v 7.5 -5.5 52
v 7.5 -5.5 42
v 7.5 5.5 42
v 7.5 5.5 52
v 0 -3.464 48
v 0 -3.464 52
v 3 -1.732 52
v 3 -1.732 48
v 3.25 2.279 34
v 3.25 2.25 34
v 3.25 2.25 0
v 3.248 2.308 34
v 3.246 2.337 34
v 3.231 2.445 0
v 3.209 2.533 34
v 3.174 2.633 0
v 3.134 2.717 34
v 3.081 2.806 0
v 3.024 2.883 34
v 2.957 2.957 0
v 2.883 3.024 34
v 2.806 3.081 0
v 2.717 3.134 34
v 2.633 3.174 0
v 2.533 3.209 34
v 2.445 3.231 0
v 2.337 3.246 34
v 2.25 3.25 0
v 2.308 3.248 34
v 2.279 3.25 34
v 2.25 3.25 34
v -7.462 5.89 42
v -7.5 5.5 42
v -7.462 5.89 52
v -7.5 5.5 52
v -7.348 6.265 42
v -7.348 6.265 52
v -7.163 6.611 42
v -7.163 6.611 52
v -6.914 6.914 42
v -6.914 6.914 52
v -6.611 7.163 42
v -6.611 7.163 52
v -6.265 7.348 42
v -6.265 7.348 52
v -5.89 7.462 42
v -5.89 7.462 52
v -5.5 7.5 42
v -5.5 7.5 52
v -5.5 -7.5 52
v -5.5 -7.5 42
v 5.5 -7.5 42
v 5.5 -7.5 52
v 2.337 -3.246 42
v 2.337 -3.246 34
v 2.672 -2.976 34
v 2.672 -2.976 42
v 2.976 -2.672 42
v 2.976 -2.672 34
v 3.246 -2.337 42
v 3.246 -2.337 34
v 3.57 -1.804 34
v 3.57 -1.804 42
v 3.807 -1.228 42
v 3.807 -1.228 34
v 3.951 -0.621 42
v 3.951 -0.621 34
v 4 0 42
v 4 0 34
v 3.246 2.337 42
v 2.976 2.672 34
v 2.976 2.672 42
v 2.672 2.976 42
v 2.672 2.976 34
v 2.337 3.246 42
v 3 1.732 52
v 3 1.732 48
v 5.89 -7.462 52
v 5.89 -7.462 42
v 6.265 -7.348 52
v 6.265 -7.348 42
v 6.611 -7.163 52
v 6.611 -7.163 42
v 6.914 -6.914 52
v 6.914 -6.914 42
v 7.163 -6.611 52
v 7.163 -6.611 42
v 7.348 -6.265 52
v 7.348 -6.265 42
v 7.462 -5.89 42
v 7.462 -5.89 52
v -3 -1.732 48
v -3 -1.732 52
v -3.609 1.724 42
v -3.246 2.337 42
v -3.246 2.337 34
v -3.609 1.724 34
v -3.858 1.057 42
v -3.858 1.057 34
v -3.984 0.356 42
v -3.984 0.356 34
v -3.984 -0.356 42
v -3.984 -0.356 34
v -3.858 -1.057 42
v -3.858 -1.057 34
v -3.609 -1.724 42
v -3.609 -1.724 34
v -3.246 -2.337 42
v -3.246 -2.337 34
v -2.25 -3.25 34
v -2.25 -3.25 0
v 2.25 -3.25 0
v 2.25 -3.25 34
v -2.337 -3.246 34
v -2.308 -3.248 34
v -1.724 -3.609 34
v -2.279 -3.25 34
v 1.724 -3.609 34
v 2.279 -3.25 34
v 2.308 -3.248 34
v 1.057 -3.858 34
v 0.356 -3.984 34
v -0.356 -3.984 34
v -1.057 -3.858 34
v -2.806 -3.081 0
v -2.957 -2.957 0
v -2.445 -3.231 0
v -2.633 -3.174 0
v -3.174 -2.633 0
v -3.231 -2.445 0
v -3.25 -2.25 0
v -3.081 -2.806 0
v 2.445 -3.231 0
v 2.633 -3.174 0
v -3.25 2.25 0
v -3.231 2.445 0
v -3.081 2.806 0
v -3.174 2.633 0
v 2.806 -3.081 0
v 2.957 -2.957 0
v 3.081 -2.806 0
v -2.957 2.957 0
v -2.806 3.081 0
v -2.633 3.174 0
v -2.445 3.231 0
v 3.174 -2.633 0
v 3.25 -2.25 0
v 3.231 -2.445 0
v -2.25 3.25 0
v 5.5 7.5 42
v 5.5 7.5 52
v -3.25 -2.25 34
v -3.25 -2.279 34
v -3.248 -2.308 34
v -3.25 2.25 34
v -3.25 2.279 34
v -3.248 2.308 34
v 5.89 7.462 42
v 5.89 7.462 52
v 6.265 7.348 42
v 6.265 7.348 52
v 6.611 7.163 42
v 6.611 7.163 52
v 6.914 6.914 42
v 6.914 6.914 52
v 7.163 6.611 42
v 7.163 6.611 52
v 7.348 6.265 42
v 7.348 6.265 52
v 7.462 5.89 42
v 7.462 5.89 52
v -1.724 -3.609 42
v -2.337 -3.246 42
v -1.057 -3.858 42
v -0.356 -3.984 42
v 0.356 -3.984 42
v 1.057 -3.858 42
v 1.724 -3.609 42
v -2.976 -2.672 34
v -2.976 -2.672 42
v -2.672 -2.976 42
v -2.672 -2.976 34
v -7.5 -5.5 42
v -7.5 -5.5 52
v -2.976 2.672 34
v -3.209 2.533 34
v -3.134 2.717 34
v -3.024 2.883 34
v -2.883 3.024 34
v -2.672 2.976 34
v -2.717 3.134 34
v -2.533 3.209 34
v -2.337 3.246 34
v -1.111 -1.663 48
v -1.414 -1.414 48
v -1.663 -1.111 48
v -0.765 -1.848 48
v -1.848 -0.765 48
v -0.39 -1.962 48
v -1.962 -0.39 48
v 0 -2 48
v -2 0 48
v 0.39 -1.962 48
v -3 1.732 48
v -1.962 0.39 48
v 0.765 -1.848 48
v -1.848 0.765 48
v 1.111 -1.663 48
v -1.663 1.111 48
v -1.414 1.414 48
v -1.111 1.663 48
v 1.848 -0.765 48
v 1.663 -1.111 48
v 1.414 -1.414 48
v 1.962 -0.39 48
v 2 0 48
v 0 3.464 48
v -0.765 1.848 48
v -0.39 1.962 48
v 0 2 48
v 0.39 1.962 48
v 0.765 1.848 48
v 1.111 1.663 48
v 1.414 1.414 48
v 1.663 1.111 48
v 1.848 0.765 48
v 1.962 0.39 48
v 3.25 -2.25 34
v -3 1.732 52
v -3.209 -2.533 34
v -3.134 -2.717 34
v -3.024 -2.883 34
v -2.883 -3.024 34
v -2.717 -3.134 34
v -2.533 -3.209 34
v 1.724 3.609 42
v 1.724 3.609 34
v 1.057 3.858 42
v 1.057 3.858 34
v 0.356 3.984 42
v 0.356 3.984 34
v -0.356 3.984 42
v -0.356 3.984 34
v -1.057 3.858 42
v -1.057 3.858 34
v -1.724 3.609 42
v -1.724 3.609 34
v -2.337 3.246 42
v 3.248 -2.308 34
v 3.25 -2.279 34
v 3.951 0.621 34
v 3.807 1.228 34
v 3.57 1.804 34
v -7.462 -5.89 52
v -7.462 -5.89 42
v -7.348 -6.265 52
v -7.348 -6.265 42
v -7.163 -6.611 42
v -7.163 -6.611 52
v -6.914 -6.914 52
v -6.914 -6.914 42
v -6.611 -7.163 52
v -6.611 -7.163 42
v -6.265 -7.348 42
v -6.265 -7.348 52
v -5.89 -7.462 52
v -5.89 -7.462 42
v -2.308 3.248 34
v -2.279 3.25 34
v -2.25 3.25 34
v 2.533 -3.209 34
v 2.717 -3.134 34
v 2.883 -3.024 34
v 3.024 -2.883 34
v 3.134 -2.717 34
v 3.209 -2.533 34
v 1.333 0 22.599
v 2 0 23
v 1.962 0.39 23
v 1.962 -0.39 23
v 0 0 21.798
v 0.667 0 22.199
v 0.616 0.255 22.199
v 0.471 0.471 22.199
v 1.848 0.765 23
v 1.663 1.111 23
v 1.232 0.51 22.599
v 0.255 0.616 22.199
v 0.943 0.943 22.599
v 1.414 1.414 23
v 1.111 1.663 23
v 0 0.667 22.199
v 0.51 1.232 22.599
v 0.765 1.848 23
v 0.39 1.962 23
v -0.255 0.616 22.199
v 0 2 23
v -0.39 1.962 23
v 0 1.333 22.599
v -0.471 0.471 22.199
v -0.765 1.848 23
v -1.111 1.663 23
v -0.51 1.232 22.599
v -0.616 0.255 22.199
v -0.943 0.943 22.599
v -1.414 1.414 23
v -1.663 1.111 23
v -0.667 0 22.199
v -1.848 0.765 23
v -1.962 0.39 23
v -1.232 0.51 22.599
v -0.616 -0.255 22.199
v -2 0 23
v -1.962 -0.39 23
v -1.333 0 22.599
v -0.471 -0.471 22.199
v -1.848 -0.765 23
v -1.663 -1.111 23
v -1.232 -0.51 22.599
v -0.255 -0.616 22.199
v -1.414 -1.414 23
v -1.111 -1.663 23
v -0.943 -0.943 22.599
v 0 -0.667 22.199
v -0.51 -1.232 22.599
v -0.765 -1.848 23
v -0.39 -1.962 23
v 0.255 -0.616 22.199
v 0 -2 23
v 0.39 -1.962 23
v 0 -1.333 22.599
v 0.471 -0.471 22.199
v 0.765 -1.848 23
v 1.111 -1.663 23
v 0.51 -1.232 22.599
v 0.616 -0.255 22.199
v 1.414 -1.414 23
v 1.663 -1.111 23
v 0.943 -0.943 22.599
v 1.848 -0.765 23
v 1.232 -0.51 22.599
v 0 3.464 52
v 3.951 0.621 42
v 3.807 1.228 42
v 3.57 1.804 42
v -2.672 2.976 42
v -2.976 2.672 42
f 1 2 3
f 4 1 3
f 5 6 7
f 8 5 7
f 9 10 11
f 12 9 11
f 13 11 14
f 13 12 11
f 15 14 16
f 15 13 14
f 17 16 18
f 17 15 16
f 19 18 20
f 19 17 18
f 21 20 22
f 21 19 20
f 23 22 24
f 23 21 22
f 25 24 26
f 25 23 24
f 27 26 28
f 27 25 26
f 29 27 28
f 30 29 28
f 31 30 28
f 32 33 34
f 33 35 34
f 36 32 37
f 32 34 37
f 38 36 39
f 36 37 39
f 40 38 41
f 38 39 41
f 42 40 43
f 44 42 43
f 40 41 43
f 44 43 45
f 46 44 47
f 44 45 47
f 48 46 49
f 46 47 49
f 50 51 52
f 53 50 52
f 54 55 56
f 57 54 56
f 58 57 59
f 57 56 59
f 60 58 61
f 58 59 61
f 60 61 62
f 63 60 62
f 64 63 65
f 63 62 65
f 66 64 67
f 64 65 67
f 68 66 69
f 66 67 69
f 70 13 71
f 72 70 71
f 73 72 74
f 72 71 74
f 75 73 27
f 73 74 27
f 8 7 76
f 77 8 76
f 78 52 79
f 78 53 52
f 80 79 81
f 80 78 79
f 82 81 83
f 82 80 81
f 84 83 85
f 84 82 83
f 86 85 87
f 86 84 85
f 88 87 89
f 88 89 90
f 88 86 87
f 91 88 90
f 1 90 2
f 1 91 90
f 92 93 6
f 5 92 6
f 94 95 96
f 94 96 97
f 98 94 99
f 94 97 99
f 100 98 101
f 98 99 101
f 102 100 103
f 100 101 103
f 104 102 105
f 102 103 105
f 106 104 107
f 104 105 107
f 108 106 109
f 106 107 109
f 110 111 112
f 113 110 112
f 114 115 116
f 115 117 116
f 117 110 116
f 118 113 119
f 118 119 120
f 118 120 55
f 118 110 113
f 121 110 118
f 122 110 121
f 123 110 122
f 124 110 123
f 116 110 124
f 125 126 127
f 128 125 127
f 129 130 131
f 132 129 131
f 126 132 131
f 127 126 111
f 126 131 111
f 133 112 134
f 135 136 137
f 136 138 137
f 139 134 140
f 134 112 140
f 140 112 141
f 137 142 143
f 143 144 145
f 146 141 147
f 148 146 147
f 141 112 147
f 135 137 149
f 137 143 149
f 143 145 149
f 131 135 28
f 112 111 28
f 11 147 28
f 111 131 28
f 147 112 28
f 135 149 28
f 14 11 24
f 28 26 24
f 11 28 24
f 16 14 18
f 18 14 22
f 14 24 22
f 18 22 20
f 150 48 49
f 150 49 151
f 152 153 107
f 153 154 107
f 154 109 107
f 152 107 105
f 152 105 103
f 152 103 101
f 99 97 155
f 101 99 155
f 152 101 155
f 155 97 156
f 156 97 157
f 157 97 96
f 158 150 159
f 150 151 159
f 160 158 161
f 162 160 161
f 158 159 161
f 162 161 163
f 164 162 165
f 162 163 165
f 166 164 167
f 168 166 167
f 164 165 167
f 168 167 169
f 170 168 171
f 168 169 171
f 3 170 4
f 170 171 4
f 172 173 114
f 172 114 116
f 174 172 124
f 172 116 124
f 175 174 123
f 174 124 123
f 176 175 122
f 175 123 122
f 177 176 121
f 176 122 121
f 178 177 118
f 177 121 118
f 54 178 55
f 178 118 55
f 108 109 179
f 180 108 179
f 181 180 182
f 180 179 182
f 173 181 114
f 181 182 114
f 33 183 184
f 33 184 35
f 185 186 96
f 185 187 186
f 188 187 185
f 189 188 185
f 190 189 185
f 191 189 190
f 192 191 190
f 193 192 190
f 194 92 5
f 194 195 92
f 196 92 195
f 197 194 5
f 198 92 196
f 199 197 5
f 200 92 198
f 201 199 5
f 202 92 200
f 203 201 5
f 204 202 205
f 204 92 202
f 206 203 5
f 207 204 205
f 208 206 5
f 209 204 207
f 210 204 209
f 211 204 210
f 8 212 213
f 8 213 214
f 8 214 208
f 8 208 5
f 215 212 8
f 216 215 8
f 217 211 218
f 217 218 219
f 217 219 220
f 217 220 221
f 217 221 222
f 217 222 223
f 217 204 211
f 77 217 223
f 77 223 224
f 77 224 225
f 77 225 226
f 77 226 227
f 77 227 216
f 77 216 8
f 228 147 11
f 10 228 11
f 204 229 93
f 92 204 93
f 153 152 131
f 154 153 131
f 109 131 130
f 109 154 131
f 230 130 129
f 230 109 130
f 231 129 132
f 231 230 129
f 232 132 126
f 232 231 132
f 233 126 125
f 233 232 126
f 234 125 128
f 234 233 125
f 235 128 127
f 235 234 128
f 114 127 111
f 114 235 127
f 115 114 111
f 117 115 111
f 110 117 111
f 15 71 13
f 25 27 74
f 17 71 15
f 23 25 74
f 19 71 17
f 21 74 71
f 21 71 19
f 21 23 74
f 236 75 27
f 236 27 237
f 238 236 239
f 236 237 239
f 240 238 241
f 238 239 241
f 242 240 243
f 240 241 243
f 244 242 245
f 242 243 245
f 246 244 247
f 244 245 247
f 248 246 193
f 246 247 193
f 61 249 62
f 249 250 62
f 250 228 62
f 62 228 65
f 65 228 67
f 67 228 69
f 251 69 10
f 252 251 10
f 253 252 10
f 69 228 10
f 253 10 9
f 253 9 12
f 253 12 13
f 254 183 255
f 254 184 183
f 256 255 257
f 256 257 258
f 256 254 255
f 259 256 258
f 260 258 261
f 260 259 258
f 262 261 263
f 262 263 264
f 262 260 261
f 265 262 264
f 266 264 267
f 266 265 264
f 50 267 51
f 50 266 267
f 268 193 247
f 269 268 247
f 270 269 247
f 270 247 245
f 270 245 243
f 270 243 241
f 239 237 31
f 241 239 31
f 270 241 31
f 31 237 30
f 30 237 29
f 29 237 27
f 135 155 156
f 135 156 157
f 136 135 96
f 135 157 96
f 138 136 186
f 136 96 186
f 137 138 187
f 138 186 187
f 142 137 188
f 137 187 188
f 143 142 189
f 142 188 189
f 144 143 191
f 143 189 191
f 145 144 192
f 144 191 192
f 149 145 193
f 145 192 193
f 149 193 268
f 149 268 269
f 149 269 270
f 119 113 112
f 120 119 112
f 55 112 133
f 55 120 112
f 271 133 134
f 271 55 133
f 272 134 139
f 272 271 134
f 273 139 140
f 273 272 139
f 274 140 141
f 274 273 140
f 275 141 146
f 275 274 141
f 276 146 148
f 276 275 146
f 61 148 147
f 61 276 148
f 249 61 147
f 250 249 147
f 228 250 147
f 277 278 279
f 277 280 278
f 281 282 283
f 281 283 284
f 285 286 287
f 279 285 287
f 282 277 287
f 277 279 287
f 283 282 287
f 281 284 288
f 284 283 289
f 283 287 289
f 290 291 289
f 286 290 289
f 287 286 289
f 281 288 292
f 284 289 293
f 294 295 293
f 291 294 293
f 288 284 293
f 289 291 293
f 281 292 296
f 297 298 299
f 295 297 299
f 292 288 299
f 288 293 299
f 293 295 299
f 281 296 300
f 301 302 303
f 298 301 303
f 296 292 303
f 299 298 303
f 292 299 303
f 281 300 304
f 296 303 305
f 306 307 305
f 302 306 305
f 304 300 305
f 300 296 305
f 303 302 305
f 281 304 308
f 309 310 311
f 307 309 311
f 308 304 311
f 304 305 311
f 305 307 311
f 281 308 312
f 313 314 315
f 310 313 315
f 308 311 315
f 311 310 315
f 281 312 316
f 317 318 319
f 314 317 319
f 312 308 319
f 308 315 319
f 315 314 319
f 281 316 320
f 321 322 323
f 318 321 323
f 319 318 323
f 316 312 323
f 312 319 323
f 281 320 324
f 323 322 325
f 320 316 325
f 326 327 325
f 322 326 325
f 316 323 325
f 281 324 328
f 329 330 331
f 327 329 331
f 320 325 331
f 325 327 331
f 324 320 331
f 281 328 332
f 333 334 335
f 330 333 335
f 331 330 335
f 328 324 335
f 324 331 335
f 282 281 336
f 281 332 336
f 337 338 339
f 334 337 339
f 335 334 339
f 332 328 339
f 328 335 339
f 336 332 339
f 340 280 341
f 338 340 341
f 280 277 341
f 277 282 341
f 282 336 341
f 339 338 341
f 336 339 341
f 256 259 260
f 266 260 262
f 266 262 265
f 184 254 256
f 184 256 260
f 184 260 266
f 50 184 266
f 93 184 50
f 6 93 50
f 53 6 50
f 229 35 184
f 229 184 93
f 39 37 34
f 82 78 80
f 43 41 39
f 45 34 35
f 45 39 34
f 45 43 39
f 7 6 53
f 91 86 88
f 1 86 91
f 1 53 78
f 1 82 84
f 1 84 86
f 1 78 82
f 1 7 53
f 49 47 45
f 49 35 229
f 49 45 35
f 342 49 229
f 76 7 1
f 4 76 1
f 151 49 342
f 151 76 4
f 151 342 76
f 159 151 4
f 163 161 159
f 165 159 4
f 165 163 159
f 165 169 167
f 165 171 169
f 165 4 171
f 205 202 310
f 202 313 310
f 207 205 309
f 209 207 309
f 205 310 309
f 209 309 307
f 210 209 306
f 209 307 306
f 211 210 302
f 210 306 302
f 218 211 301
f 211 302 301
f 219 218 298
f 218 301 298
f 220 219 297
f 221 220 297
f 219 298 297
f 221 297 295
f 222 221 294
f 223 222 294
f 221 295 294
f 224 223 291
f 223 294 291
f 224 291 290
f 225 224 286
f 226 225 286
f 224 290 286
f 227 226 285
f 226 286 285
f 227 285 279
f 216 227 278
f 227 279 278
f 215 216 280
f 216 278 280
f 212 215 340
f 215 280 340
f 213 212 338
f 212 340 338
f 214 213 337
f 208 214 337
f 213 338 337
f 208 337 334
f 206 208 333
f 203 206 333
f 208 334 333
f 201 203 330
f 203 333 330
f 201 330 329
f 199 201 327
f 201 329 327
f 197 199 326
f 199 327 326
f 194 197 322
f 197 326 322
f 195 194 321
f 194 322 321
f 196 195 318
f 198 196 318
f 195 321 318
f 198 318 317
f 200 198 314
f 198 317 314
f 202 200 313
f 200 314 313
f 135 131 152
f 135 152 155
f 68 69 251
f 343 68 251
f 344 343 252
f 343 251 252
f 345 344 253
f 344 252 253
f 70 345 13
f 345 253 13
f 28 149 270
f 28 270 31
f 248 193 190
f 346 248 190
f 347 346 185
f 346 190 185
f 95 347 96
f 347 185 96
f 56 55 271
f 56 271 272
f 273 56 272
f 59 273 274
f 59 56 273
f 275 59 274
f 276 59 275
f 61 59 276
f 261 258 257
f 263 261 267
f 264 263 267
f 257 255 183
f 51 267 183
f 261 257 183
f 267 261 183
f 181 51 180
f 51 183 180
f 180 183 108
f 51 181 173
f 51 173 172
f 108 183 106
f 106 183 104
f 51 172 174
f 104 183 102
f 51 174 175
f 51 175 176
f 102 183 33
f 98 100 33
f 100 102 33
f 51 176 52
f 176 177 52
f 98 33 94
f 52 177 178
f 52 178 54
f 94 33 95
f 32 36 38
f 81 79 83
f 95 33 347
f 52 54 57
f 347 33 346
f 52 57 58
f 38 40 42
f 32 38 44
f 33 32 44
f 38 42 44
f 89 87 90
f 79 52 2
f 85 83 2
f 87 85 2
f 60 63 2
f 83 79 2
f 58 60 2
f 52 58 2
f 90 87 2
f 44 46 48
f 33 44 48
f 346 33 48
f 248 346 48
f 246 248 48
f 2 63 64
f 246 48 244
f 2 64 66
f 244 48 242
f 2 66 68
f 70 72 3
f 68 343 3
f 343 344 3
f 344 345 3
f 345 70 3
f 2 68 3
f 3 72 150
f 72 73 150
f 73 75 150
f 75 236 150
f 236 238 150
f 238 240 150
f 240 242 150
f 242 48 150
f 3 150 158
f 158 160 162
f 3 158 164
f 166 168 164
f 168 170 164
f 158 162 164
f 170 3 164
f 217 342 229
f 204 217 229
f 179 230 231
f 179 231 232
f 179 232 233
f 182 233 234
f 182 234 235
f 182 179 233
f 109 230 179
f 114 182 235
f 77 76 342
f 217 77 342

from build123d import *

# Parameters (mm, degrees)
F0_W      = 6.5
F0_H      = 6.5
F1_DEPTH  = 34
F2_R      = 1
F4_DEPTH  = 8
F5_W      = 15
F5_H      = 15
F5_R      = 4
F6_DEPTH  = 10
F8_DEPTH  = 4
F10_D     = 4
F10_DEPTH = 25
F10_TIP   = 1.2017212381
F11_R     = 2


with BuildPart() as f1:
    # F0 (on Top) → F1 (new body)
    with BuildSketch(Plane.XY):
        Rectangle(F0_W, F0_H)
    extrude(amount=F1_DEPTH)

    # F2
    f2_edges = [f1.edges().sort_by_distance(p)[0] for p in [
        (-3.25, 3.25, 17),
        (3.25, 3.25, 17),
        (3.25, -3.25, 17),
        (-3.25, -3.25, 17),
    ]]
    fillet(f2_edges, radius=F2_R)

    # F3 (on face) → F4 (join)
    with BuildSketch(Plane.XY.offset(34)):
        with BuildLine():
            ThreePointArc((3.25, 2.25), (3.249048632, 2.2936099868), (3.2461963381, 2.3371369952))
            ThreePointArc((3.2461963381, 2.3371369952), (2.8284271247, 2.8284271247), (2.3371369952, 3.2461963381))
            ThreePointArc((2.3371369952, 3.2461963381), (2.2936099868, 3.249048632), (2.25, 3.25))
            Line((2.25, 3.25), (-2.25, 3.25))
            ThreePointArc((-2.25, 3.25), (-2.2936099868, 3.249048632), (-2.3371369952, 3.2461963381))
            ThreePointArc((-2.3371369952, 3.2461963381), (-2.8284271247, 2.8284271247), (-3.2461963381, 2.3371369952))
            ThreePointArc((-3.2461963381, 2.3371369952), (-3.249048632, 2.2936099868), (-3.25, 2.25))
            Line((-3.25, 2.25), (-3.25, -2.25))
            ThreePointArc((-3.25, -2.25), (-3.249048632, -2.2936099868), (-3.2461963381, -2.3371369952))
            ThreePointArc((-3.2461963381, -2.3371369952), (-2.8284271247, -2.8284271247), (-2.3371369952, -3.2461963381))
            ThreePointArc((-2.3371369952, -3.2461963381), (-2.2936099868, -3.249048632), (-2.25, -3.25))
            Line((-2.25, -3.25), (2.25, -3.25))
            ThreePointArc((2.25, -3.25), (2.2936099868, -3.249048632), (2.3371369952, -3.2461963381))
            ThreePointArc((2.3371369952, -3.2461963381), (2.8284271247, -2.8284271247), (3.2461963381, -2.3371369952))
            ThreePointArc((3.2461963381, -2.3371369952), (3.249048632, -2.2936099868), (3.25, -2.25))
            Line((3.25, -2.25), (3.25, 2.25))
        make_face()
        with BuildLine():
            ThreePointArc((3.2461963381, -2.3371369952), (3.8068875313, -1.2278466206), (4, 0))
            ThreePointArc((4, 0), (3.8068875313, 1.2278466206), (3.2461963381, 2.3371369952))
            ThreePointArc((3.2461963381, 2.3371369952), (3.249048632, 2.2936099868), (3.25, 2.25))
            Line((3.25, 2.25), (3.25, -2.25))
            ThreePointArc((3.25, -2.25), (3.249048632, -2.2936099868), (3.2461963381, -2.3371369952))
        make_face()
        with BuildLine():
            ThreePointArc((2.25, 3.25), (2.2936099868, 3.249048632), (2.3371369952, 3.2461963381))
            ThreePointArc((2.3371369952, 3.2461963381), (0, 4), (-2.3371369952, 3.2461963381))
            ThreePointArc((-2.3371369952, 3.2461963381), (-2.2936099868, 3.249048632), (-2.25, 3.25))
            Line((-2.25, 3.25), (2.25, 3.25))
        make_face()
        with BuildLine():
            ThreePointArc((-2.3371369952, -3.2461963381), (0, -4), (2.3371369952, -3.2461963381))
            ThreePointArc((2.3371369952, -3.2461963381), (2.2936099868, -3.249048632), (2.25, -3.25))
            Line((2.25, -3.25), (-2.25, -3.25))
            ThreePointArc((-2.25, -3.25), (-2.2936099868, -3.249048632), (-2.3371369952, -3.2461963381))
        make_face()
        with BuildLine():
            ThreePointArc((-3.25, 2.25), (-3.249048632, 2.2936099868), (-3.2461963381, 2.3371369952))
            ThreePointArc((-3.2461963381, 2.3371369952), (-4, 0), (-3.2461963381, -2.3371369952))
            ThreePointArc((-3.2461963381, -2.3371369952), (-3.249048632, -2.2936099868), (-3.25, -2.25))
            Line((-3.25, -2.25), (-3.25, 2.25))
        make_face()
    extrude(amount=F4_DEPTH)

    # F5 (on face) → F6 (join)
    with BuildSketch(Plane.XY.offset(42)):
        Rectangle(F5_W, F5_H)
        Circle(F5_R, mode=Mode.SUBTRACT)
        Circle(F5_R)
    extrude(amount=F6_DEPTH)

    # F7 (on face) → F8 (cut)
    with BuildSketch(Plane.XY.offset(52)):
        Polygon((-3, 1.7320508076), (-3, -1.7320508076), (0, -3.4641016151), (3, -1.7320508076), (3, 1.7320508076), (0, 3.4641016151), align=None)
    extrude(amount=-F8_DEPTH, mode=Mode.SUBTRACT)

    # F10
    with Locations(Plane.XY.offset(48)):
        with Locations((0, 0)):
            Hole(F10_D / 2, depth=F10_DEPTH)
            with Locations((0, 0, -(F10_DEPTH + F10_TIP / 2))):  # 118° drill point
                Cone(0, F10_D / 2, F10_TIP, mode=Mode.SUBTRACT)

    # F11
    f11_edges = [f1.edges().sort_by_distance(p)[0] for p in [
        (7.5, 7.5, 47),
        (-7.5, 7.5, 47),
        (-7.5, -7.5, 47),
        (7.5, -7.5, 47),
    ]]
    fillet(f11_edges, radius=F11_R)


solid = f1.part
